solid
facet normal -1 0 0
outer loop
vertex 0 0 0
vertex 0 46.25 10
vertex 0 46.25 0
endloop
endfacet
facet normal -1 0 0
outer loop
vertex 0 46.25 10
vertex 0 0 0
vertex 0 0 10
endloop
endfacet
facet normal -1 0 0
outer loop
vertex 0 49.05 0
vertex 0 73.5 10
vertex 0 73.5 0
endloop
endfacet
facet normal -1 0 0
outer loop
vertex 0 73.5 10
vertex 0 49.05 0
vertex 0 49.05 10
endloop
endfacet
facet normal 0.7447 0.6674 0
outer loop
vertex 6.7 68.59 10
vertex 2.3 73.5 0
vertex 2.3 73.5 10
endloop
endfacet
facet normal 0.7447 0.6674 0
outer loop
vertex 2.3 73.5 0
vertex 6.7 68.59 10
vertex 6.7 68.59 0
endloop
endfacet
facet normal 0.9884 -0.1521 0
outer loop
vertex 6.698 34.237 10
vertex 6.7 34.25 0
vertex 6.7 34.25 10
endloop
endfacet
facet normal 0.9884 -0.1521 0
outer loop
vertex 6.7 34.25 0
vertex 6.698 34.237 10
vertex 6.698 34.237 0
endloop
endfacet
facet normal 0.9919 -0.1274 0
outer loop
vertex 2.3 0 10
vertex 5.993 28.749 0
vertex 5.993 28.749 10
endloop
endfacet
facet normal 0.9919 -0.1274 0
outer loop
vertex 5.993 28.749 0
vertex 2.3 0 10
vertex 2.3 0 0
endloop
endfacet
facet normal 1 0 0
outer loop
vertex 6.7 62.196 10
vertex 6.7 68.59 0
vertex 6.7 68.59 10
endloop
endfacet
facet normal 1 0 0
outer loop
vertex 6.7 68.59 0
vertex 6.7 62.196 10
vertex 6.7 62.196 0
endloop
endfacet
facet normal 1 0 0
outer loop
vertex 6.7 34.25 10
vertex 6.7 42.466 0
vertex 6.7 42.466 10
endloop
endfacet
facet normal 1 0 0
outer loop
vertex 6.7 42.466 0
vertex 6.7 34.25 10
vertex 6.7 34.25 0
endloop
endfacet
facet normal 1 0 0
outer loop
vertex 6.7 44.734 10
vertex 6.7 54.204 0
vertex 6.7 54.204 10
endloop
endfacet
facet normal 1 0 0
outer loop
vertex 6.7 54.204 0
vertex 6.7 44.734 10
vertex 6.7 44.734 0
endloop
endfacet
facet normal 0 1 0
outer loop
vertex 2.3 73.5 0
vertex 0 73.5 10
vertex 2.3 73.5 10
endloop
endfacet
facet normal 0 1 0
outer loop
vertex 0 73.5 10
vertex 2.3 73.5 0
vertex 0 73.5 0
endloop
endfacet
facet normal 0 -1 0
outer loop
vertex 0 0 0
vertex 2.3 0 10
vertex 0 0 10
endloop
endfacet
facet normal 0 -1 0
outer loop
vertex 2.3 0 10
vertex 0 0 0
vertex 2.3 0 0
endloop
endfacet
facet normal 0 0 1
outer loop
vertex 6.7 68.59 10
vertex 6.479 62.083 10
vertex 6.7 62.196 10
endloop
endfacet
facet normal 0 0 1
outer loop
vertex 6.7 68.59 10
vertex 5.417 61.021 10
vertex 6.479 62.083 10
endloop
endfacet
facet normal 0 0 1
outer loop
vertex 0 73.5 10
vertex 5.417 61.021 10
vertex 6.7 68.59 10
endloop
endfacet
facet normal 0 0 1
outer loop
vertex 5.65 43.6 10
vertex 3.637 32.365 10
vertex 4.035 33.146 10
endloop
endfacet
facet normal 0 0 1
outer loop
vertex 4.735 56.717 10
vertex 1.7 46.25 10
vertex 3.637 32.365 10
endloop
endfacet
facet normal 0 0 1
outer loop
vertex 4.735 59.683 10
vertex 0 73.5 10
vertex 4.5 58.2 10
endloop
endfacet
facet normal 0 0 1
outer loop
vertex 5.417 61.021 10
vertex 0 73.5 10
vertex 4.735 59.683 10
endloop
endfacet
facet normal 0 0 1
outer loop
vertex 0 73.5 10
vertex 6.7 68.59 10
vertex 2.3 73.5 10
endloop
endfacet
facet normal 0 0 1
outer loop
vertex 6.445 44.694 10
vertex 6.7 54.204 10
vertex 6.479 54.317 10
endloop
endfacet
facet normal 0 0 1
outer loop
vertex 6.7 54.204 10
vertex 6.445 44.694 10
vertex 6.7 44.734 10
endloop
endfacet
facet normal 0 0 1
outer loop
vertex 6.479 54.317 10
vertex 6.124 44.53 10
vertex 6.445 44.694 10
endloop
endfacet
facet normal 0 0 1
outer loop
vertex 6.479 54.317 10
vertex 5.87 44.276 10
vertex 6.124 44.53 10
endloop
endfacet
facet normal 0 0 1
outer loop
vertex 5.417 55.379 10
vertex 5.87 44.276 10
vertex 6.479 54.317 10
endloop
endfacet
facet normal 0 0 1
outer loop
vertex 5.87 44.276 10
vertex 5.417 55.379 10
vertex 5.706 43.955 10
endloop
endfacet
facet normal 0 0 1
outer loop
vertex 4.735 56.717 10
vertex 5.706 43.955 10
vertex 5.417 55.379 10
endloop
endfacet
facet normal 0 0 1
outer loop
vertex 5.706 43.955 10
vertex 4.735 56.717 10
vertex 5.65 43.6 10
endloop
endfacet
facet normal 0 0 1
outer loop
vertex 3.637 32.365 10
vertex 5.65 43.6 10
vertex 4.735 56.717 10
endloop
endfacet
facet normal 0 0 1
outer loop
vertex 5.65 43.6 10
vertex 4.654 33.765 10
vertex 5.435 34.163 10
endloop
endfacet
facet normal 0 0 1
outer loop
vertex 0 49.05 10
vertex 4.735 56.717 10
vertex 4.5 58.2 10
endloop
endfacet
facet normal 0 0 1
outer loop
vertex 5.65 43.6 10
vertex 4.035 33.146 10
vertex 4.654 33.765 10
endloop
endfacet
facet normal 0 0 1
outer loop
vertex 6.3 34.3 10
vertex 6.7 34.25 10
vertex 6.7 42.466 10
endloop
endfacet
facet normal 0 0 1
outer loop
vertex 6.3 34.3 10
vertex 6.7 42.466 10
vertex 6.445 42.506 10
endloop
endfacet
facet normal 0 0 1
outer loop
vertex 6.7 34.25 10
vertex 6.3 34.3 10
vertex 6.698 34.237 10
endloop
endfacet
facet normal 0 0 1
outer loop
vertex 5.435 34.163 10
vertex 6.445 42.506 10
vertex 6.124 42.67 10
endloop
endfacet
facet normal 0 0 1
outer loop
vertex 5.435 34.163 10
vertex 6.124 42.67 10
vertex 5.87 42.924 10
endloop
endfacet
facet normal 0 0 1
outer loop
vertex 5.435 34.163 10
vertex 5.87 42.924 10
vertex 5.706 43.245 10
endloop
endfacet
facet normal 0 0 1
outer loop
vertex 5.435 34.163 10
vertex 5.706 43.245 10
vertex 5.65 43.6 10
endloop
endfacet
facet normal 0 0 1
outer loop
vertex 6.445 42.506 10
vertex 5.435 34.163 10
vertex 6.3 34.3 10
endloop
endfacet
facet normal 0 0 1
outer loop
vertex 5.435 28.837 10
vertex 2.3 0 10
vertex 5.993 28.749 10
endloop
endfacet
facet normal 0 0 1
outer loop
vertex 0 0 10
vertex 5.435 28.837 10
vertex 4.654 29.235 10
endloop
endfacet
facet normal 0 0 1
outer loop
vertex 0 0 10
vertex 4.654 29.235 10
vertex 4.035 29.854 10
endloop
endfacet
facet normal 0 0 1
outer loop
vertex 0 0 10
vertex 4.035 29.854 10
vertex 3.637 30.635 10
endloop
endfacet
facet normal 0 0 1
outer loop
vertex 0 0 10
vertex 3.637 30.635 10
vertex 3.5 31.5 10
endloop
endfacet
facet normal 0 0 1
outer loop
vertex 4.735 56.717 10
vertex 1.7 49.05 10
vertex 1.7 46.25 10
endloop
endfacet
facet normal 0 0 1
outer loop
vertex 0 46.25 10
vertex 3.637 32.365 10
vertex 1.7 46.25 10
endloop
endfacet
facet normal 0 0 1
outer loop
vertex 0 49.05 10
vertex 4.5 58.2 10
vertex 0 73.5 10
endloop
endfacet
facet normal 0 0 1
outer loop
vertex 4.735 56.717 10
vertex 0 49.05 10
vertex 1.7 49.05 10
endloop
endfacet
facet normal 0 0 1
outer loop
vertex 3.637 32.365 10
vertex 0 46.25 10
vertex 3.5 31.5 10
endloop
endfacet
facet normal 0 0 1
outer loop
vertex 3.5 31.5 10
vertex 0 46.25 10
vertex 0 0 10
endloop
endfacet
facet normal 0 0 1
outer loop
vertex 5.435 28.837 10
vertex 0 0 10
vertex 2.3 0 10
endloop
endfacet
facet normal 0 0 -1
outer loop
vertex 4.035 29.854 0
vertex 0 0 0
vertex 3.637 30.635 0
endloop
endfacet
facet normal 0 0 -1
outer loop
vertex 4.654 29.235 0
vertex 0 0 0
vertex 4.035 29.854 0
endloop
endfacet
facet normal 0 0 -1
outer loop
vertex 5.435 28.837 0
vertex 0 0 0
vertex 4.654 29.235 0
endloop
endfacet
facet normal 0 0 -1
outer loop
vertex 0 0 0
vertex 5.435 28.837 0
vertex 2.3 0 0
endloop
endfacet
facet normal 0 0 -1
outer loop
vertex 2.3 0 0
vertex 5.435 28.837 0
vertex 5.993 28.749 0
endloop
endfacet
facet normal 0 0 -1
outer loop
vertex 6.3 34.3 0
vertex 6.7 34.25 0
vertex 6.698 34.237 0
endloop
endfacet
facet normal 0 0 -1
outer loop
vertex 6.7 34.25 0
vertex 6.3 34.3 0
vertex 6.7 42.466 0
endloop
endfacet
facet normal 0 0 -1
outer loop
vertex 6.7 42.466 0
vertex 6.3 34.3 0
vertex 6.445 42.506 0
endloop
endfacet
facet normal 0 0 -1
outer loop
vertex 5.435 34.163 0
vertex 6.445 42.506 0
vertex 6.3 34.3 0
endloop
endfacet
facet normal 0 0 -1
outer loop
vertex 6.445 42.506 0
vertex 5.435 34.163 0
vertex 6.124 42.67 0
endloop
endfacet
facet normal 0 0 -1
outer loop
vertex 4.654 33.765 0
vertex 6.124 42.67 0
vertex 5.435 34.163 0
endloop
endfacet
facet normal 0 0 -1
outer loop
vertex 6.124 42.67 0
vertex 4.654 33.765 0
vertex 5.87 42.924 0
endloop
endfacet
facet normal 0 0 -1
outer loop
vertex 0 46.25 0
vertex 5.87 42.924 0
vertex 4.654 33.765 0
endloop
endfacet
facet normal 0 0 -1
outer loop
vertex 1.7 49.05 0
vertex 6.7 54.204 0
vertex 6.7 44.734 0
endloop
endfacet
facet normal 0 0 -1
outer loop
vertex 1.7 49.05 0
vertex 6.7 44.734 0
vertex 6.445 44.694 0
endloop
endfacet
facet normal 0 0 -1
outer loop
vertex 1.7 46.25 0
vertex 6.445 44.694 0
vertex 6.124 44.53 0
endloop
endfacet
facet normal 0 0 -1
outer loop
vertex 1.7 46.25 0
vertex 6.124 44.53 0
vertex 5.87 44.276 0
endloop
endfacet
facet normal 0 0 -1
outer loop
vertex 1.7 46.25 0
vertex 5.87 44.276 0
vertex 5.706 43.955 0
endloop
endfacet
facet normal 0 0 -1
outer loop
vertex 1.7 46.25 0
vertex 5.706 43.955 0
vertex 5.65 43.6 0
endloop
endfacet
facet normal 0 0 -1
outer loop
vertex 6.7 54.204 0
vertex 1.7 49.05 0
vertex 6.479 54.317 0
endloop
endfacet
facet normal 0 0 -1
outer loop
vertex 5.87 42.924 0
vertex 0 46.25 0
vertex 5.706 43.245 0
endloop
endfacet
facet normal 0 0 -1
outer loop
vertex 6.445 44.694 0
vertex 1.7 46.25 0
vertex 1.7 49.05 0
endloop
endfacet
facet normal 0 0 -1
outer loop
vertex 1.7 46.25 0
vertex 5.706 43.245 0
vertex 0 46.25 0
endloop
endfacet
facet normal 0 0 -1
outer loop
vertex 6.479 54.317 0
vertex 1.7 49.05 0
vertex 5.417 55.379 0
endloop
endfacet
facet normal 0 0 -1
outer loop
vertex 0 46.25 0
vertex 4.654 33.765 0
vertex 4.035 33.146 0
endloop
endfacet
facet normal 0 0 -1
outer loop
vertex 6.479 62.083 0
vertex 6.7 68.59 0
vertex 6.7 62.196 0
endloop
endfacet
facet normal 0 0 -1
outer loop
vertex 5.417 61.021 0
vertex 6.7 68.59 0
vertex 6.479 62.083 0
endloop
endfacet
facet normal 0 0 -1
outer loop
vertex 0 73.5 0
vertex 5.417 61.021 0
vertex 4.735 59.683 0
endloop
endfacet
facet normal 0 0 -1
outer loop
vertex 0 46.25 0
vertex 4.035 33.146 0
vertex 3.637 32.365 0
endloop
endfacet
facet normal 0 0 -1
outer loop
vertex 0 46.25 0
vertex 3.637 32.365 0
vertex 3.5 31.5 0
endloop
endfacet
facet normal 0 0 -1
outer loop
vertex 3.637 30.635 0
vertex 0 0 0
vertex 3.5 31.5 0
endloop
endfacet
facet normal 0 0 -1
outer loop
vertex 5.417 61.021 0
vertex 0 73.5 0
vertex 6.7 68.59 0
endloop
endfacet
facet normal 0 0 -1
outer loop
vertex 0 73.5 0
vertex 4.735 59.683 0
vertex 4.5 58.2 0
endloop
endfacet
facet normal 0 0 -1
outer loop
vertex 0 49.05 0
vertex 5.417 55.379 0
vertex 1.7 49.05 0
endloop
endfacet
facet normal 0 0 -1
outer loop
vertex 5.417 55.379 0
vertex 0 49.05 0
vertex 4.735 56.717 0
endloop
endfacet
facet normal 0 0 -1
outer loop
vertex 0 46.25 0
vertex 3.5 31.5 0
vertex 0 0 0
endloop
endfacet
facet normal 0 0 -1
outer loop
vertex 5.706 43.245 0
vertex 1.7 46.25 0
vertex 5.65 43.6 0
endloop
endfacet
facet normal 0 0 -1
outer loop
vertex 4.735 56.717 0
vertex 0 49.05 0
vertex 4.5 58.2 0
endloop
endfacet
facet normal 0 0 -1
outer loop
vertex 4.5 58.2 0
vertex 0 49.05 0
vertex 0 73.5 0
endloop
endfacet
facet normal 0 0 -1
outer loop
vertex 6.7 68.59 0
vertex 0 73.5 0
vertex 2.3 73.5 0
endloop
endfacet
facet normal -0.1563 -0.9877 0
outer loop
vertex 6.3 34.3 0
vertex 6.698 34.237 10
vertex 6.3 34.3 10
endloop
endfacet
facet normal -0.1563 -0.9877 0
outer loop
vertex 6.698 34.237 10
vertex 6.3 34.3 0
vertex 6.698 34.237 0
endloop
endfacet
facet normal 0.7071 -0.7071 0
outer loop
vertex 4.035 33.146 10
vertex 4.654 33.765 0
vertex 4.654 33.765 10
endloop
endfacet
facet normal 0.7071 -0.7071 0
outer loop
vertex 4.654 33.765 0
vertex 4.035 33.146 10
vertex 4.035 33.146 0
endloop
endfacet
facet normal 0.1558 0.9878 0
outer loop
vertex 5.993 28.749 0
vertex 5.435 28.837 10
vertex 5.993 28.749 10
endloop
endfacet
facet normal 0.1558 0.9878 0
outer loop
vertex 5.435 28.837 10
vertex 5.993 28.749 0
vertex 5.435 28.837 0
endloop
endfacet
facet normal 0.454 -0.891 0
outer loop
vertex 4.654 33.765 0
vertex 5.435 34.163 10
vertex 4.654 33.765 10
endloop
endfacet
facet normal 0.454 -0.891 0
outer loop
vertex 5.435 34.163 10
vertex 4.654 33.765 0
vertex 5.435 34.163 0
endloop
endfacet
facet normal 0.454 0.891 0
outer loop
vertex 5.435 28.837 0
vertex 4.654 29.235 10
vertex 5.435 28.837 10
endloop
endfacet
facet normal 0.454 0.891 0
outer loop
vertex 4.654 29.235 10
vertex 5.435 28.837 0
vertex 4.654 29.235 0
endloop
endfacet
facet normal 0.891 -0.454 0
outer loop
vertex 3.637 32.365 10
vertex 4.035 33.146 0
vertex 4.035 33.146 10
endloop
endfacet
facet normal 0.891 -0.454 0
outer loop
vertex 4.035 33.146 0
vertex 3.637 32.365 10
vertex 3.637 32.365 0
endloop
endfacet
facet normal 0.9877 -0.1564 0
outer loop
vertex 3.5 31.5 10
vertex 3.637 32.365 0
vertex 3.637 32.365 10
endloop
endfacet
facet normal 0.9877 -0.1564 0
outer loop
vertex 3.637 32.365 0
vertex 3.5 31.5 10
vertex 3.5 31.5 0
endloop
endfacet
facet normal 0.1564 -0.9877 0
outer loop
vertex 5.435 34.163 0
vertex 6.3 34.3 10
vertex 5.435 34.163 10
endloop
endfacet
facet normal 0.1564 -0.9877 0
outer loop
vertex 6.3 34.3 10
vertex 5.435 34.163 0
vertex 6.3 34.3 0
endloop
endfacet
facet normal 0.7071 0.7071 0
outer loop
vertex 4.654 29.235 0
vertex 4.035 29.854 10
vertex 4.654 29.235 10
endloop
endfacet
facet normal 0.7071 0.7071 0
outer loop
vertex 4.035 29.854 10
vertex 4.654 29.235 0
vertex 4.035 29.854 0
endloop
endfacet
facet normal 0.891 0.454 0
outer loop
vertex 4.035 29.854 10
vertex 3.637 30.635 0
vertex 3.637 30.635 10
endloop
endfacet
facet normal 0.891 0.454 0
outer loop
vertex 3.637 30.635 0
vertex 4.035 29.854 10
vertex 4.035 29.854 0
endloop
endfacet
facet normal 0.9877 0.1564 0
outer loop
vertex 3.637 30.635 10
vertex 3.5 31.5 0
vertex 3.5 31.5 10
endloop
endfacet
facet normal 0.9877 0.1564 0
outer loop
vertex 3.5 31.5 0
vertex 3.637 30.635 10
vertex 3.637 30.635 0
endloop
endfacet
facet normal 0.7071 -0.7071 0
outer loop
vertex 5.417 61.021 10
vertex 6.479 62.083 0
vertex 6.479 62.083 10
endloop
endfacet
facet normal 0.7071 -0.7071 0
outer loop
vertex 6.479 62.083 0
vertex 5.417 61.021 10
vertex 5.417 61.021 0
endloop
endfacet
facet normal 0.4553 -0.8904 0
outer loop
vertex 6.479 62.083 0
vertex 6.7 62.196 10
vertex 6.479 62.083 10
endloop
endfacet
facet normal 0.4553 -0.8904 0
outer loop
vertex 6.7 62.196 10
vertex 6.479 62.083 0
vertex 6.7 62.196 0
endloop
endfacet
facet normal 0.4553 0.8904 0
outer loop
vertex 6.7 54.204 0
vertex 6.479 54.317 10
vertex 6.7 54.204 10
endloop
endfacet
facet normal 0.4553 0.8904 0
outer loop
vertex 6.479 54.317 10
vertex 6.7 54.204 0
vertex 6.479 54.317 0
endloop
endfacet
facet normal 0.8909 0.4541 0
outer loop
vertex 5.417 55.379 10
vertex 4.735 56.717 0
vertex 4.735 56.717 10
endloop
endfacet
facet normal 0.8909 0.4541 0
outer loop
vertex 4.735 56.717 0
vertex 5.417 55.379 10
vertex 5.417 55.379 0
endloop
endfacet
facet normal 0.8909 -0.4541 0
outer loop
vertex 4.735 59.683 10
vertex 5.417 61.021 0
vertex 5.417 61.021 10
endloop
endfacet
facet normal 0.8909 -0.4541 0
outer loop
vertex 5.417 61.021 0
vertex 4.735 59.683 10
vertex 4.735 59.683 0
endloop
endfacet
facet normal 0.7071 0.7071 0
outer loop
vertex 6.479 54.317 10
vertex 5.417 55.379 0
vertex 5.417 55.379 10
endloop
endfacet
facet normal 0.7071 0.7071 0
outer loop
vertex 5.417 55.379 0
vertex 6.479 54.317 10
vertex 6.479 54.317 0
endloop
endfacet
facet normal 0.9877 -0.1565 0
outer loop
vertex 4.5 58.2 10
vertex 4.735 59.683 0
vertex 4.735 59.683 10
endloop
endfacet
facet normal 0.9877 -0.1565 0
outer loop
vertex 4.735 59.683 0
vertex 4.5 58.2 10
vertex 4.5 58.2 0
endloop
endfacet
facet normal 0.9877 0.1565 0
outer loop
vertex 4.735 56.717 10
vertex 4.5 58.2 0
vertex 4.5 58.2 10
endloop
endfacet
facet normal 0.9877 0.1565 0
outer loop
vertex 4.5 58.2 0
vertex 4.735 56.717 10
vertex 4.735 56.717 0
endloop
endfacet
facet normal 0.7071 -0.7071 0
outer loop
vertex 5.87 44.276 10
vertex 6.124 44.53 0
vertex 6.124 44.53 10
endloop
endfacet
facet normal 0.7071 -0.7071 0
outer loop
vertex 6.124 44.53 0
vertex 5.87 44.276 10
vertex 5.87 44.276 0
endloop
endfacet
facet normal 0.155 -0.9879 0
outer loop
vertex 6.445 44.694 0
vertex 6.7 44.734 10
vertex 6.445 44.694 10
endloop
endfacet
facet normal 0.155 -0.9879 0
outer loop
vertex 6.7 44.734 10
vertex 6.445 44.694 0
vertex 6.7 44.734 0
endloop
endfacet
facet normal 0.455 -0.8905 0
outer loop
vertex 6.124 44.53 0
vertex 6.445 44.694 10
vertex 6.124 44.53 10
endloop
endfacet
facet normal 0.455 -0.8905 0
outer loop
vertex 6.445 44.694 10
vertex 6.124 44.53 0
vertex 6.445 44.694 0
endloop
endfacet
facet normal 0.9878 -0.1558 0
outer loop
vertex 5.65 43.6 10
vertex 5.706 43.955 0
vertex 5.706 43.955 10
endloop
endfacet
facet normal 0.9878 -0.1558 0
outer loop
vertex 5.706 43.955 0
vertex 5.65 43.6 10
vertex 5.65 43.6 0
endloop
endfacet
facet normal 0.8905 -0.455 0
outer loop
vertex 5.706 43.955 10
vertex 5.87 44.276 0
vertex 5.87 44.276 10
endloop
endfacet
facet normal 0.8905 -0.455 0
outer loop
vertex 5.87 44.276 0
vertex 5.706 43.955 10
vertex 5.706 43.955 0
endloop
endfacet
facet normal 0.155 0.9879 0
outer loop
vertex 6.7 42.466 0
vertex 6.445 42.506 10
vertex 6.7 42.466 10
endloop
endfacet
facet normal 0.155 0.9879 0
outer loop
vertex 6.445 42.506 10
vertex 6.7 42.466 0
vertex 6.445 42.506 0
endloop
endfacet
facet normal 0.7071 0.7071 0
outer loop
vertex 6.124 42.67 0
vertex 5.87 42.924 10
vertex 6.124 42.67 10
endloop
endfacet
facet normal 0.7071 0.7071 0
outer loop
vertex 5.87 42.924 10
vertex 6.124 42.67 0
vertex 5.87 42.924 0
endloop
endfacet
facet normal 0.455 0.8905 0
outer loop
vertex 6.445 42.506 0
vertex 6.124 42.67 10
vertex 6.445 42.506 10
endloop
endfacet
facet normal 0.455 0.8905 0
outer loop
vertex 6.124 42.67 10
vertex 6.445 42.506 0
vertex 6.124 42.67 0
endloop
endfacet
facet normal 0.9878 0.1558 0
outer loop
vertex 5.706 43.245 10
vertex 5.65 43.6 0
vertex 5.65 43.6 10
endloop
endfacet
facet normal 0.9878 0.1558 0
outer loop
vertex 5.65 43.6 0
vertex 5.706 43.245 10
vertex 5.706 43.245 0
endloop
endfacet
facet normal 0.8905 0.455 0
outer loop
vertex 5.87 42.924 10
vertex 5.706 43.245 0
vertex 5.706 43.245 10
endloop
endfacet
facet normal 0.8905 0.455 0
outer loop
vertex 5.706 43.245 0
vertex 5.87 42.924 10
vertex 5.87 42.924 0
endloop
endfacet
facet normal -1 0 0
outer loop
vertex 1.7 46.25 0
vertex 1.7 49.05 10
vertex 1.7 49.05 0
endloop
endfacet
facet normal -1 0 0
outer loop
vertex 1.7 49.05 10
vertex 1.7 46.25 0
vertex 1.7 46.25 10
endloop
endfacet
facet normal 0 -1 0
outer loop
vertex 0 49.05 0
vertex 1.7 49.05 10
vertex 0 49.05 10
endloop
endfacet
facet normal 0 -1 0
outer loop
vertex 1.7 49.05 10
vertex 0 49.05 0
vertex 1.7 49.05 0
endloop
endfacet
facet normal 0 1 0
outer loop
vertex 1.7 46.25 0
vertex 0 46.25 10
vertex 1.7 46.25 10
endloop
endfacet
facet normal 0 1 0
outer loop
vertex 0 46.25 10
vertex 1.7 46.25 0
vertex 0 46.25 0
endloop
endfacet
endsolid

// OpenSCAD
//Loguncov Maxim

difference(){
linear_extrude(height=10)
polygon(points=[[0,0],[0,73.5],[2.3,73.5],[6.7,68.59],[6.7,34.25],[2.3,0]],paths=[[0,1,2,3,4,5]]);
translate([6.3,31.5,-2]) cylinder(h = 14, r=2.8, $fn=20);
translate([9.3,58.2,-2]) cylinder(h = 14, r=4.8, $fn=20);
translate([6.8,43.6,-2]) cylinder(h = 14, r=1.15, $fn=20);
translate([0,46.25,-2]) cube([1.7,2.8,14]);
}
